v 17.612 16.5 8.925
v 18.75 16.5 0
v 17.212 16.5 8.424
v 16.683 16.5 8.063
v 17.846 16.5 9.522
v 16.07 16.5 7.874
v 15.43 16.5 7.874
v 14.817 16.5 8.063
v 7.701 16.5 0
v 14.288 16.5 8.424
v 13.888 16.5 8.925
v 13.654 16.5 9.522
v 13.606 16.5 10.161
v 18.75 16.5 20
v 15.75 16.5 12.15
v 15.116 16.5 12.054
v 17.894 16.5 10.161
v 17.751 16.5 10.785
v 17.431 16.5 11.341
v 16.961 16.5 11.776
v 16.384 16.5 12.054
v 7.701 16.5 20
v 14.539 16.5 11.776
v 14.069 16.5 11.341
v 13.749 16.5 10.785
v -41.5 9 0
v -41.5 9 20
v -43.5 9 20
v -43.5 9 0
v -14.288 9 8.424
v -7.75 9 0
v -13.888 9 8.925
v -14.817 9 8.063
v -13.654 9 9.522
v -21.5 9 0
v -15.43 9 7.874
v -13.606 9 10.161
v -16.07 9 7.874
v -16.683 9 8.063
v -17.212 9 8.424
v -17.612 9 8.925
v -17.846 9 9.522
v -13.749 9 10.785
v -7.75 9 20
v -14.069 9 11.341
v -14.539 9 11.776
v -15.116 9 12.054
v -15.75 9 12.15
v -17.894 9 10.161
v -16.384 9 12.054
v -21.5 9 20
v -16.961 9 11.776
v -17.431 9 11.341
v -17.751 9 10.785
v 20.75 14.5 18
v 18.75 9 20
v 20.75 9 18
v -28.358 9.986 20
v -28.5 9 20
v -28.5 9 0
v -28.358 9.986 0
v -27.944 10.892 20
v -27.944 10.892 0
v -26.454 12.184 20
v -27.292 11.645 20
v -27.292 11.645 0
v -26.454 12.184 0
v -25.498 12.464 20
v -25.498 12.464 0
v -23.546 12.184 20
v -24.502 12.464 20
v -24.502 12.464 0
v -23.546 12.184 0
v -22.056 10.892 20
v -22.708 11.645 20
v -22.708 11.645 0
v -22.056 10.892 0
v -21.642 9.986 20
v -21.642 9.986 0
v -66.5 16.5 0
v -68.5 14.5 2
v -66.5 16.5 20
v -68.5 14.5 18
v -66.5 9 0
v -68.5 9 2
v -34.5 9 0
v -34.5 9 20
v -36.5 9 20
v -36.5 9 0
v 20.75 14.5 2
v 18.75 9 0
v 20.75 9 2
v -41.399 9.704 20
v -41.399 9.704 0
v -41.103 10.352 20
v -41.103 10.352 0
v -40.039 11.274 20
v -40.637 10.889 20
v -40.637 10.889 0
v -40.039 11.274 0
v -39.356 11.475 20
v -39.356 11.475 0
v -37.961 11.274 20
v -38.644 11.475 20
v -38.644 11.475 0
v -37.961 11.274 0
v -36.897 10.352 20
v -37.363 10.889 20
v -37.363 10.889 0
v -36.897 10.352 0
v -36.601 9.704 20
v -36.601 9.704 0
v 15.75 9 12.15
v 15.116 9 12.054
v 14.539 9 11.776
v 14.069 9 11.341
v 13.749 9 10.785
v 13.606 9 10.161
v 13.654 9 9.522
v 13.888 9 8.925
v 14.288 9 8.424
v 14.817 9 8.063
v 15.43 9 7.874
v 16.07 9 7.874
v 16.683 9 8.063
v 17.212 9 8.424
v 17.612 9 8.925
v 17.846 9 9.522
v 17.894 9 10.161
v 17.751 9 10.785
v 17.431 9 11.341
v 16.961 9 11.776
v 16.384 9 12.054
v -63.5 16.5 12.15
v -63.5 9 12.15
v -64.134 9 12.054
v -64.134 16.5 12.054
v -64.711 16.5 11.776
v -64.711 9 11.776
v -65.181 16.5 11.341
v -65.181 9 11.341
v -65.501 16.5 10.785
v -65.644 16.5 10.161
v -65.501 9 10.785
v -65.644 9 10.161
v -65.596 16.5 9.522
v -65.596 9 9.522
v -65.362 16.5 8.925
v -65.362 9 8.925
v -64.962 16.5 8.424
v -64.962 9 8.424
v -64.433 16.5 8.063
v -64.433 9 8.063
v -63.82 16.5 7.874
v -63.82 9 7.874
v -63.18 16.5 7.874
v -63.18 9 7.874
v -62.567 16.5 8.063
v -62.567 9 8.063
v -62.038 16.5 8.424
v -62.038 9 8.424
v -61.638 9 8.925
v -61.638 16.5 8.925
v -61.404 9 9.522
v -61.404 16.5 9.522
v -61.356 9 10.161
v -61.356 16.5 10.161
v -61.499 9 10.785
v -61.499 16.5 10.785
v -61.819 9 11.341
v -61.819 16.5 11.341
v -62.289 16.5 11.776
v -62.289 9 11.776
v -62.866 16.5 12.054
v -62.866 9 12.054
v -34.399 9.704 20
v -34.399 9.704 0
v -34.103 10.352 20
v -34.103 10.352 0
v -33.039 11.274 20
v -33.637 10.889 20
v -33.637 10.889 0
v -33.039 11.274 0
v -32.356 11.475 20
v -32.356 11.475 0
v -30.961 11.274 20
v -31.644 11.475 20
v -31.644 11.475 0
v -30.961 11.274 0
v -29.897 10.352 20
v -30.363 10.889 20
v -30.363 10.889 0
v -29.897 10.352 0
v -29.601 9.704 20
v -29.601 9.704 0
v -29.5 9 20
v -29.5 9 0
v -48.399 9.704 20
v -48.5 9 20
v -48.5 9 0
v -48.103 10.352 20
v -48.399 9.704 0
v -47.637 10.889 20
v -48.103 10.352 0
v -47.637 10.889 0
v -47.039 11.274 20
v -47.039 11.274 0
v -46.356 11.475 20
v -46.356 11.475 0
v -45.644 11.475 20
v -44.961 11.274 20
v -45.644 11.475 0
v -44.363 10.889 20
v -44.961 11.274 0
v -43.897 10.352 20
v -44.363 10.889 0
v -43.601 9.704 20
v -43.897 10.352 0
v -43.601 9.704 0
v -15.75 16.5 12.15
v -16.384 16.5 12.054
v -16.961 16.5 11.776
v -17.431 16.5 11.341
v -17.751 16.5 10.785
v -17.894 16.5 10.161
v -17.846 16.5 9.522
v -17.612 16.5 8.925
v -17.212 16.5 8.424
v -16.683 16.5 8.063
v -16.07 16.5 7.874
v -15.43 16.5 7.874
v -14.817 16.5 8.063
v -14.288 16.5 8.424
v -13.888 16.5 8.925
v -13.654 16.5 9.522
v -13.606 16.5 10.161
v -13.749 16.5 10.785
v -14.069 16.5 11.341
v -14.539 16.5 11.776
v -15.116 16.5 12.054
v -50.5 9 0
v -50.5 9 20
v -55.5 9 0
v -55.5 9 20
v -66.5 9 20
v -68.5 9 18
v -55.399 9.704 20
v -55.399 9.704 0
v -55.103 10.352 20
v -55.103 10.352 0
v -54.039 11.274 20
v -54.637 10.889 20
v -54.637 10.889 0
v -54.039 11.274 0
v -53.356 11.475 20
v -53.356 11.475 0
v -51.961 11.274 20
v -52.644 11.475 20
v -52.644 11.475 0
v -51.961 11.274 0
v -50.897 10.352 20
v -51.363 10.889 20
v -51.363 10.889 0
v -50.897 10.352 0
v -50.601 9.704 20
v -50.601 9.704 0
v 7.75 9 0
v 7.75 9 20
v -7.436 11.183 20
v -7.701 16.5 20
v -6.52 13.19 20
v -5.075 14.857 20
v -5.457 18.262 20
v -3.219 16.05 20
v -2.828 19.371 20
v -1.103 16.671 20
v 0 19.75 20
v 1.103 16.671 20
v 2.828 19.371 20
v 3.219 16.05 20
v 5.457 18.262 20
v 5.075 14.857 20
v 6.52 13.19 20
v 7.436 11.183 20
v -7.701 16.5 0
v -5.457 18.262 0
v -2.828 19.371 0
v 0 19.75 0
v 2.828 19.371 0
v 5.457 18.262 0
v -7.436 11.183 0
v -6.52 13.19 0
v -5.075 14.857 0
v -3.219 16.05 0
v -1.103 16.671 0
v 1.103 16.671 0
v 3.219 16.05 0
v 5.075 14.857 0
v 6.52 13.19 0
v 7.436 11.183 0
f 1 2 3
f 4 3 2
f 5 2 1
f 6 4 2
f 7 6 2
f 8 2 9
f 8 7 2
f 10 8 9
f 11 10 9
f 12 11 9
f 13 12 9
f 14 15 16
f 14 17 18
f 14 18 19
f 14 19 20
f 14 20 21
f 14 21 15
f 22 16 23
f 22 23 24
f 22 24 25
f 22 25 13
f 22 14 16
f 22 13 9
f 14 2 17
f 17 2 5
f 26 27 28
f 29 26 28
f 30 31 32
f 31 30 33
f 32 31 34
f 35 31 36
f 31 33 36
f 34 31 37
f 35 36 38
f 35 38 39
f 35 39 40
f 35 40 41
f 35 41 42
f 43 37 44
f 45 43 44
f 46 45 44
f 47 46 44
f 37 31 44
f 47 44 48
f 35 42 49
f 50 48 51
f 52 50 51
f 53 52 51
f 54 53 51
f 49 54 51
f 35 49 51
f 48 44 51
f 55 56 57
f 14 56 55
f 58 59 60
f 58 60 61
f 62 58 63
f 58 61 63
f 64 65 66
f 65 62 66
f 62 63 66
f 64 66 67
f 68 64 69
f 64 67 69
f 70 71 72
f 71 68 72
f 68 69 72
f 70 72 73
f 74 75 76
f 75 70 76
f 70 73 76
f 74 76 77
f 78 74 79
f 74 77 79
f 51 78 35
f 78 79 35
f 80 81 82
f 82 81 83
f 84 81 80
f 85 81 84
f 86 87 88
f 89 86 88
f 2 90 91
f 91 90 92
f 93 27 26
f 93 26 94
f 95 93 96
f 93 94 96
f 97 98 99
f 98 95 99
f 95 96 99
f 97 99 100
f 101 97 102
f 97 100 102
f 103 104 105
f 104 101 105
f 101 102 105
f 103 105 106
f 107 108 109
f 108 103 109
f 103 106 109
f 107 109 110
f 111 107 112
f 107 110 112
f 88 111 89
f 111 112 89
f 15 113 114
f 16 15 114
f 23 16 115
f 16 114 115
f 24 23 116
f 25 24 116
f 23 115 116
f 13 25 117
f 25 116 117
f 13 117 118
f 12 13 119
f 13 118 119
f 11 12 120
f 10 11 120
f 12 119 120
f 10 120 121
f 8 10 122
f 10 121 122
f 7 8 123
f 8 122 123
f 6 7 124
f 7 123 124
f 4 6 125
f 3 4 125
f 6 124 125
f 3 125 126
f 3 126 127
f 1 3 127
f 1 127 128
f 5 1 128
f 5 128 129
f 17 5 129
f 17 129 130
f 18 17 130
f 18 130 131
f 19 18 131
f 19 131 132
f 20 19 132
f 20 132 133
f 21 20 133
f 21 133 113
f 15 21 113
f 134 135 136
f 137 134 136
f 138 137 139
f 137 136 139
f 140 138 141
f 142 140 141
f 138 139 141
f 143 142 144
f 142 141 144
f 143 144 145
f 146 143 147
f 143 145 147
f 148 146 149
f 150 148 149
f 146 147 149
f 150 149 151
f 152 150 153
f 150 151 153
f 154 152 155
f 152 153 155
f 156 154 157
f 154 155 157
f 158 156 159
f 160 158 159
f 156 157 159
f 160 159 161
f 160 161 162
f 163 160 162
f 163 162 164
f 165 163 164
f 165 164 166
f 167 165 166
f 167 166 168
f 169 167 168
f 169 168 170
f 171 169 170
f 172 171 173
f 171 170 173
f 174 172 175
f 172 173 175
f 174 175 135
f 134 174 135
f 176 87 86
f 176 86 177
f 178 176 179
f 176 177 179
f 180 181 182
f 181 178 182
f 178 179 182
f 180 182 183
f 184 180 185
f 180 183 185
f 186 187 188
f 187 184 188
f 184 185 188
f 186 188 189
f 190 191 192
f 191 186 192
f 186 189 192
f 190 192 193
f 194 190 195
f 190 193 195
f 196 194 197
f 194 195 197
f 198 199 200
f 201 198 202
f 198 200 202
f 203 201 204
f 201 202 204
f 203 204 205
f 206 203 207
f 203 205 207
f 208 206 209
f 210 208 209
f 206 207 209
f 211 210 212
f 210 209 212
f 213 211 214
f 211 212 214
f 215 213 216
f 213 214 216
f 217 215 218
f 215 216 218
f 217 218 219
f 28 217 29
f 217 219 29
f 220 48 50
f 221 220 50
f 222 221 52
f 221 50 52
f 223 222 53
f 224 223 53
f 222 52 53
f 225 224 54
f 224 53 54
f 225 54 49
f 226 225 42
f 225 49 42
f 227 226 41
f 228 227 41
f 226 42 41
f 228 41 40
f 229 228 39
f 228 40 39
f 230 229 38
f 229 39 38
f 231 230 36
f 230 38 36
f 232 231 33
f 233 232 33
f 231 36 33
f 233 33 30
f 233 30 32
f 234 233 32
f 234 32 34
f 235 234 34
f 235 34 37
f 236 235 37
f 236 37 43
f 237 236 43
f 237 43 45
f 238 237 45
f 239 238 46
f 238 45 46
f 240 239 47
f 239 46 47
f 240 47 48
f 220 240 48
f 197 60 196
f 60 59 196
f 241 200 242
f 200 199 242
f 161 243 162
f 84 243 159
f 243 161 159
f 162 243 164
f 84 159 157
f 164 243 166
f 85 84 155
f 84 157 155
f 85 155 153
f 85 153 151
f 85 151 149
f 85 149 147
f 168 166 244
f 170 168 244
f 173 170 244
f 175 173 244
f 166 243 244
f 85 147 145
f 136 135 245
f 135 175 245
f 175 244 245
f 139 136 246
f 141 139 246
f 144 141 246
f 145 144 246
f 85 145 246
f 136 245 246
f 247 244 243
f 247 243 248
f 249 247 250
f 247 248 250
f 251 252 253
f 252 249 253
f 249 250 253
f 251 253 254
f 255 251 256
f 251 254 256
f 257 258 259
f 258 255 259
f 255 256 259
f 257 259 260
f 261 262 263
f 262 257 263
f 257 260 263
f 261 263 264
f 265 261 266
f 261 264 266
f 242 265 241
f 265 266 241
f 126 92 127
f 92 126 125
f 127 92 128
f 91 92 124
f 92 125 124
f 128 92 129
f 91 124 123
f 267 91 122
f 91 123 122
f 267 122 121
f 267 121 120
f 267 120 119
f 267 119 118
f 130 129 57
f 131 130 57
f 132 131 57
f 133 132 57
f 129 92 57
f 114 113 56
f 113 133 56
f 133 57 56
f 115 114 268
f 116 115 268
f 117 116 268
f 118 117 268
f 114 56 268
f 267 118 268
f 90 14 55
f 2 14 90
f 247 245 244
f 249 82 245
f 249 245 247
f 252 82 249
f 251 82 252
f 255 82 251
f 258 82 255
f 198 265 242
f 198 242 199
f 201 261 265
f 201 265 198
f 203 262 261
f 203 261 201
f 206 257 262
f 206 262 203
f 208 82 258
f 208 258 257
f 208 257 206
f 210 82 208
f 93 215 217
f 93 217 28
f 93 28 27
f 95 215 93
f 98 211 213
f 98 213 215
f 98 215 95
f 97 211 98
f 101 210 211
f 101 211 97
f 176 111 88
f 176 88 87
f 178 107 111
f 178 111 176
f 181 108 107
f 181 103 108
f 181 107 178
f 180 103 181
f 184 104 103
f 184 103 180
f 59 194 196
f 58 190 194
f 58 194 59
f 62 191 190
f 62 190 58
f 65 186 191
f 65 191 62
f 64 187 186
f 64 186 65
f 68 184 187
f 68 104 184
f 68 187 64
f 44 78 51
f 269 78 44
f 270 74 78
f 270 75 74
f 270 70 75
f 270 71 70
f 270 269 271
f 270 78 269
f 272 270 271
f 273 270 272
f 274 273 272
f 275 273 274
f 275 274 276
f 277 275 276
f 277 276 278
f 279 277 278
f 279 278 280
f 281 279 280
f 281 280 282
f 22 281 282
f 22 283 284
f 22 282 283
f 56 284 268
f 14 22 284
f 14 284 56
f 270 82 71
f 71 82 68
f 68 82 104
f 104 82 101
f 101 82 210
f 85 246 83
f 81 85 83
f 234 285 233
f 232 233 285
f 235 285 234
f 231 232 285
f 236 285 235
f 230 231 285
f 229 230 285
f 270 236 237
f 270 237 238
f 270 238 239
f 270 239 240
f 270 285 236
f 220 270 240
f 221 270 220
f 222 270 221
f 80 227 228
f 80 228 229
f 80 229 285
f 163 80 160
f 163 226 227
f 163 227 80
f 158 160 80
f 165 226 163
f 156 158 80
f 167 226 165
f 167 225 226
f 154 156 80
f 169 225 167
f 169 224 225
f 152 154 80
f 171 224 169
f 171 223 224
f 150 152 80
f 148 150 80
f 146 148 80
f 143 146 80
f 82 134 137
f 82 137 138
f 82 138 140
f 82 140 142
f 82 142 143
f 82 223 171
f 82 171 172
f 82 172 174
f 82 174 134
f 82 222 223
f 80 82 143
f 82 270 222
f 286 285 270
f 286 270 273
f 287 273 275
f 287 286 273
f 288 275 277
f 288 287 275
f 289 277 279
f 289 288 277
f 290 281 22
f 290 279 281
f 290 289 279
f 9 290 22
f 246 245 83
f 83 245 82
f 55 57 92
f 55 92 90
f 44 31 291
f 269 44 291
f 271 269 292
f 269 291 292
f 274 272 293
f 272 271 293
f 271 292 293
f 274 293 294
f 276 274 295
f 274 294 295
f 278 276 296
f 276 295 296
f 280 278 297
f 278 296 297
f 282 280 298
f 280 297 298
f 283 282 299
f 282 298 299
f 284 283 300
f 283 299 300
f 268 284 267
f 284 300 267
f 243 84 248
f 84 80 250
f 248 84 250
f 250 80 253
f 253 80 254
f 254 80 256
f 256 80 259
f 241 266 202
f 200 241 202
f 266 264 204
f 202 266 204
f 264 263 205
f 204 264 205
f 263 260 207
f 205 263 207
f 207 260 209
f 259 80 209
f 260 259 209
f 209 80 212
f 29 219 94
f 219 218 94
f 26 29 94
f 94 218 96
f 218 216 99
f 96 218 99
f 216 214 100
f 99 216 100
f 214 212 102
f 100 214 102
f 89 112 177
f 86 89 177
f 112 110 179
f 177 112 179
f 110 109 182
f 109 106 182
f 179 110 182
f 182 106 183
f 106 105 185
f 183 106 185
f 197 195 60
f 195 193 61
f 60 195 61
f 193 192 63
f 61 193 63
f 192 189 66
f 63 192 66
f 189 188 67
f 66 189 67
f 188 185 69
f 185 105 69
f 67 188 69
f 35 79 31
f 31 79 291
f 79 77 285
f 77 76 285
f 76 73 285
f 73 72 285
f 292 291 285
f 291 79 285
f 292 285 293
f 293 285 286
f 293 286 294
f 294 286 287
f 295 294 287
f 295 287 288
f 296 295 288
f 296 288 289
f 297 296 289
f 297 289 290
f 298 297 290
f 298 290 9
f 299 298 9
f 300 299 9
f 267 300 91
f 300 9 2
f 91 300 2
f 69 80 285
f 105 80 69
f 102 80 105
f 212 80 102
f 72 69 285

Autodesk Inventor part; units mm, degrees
ref_plane "YZ Plane" through (0, 0, 0) normal (1, 0, 0) x (0, 1, 0)
ref_plane "XZ Plane" through (0, 0, 0) normal (0, 1, 0) x (-1, 0, 0)
ref_plane "XY Plane" through (0, 0, 0) normal (0, 0, 1) x (1, 0, 0)
sketch "スケッチ1" plane through (0, 0, 0) normal (0, 0, 1) x (1, 0, 0)
  circle A0 centre (0, 9) radius 7.75
  line L0 (10.75, 0) -> (-58.5, 0)
  line L1 (-58.5, 0) -> (-58.5, 1.25)
  line L2 (-58.5, 1.25) -> (10.75, 1.25)
  line L3 (10.75, 1.25) -> (10.75, 0)
  circle A1 centre (0, 9) radius 10.75
  line L4 (10.75, 1.25) -> (10.75, 15.8822)
  circle A2 centre (-32, 9) radius 2.5
  circle A3 centre (-39, 9) radius 2.5
  circle A4 centre (-25, 9) radius 3.5
  circle A5 centre (-46, 9) radius 2.5
  circle A6 centre (-53, 9) radius 2.5
  circle A7 centre (-53, 9) radius 5.5
  line L5 (-58.5, 1.25) -> (-58.5, 18.7354)
  line L6 (-61.6708, 14.5) -> (12.7388, 14.5)
  point P0 (0, 0)
  point P1 (-9.2365, 14.5)
  point P2 (-58.5, 14.5)
  point P3 (10.75, 14.5)
  point P4 (9.2365, 14.5)
  dimension "d0" = 15.5
  dimension "d1" = 3
  dimension "d2" = 5
  dimension "d3" = 5
  dimension "d4" = 7
  dimension "d5" = 5
  dimension "d7" = 7
  dimension "d8" = 7
  dimension "d9" = 25
  dimension "d10" = 7
  dimension "d11" = 5
  dimension "d12" = 7
  dimension "d13" = 3
  dimension "d16" = 9
extrude "押し出し1" add sketch "スケッチ1" along normal blind 20 contours A0 L6 A1 L2 | A0 L6 A1 | L2 A1 L6 A0 | L2 A1 L0 | L6 L4 A1 | A1 L0 L1 L2 | L2 L5 A7 A5 L6 A1 | A1 L4 L2 | L2 L3 L0 A1 | A7 A5 | A7 L5 L6 picked at (-49.0972, 10.8197)
sketch "スケッチ3" plane through (0, 0, 20) normal (0, 0, 1) x (1, 0, 0)
  line L0 (-9.2365, 14.5) -> (-58.5, 14.5) projected
  line L1 (-58.5, 14.5) -> (-58.5, 0) projected
  line L2 (-58.5, 0) -> (10.75, 0) projected
  line L3 (10.75, 0) -> (10.75, 14.5) projected
  line L4 (10.75, 14.5) -> (9.2365, 14.5) projected
  arc A0 (9.2365, 14.5) -> (-9.2365, 14.5) centre (0, 9) ccw projected
  circle A1 centre (0, 9) radius 7.75 projected
  circle A2 centre (-53, 9) radius 2.5 projected
  circle A3 centre (-25, 9) radius 3.5 projected
  circle A4 centre (-39, 9) radius 2.5 projected
  circle A5 centre (-32, 9) radius 2.5 projected
  circle A6 centre (-46, 9) radius 2.5 projected
  line L5 (-58.5, 14.5) -> (-58.5, 0) projected
  line L6 (-58.5, 0) -> (-68.5, 0)
  line L7 (-68.5, 0) -> (-68.5, 14.5)
  line L8 (-68.5, 14.5) -> (-58.5, 14.5)
  line L9 (-58.5, 14.5) -> (-58.5, 0)
  line L10 (10.75, 0) -> (20.75, 0)
  line L11 (20.75, 0) -> (20.75, 14.5)
  line L12 (20.75, 14.5) -> (10.75, 14.5)
  line L13 (10.75, 14.5) -> (10.75, 0)
  point P0 (0, 0)
  dimension "d17" = 10
  dimension "d18" = 10
extrude "押し出し2" add sketch "スケッチ3" against normal up to surface (20 mm away) contours L1 L6 L7 L8 | L12 L11 L10 L3
sketch "スケッチ4" plane through (0, 0, 20) normal (0, 0, 1) x (1, 0, 0)
  line L0 (-9.2365, 14.5) -> (-68.5, 14.5) projected
  line L1 (-68.5, 14.5) -> (-68.5, 0) projected
  line L2 (-68.5, 0) -> (20.75, 0) projected
  line L3 (20.75, 0) -> (20.75, 14.5) projected
  line L4 (20.75, 14.5) -> (9.2365, 14.5) projected
  arc A0 (9.2365, 14.5) -> (-9.2365, 14.5) centre (0, 9) ccw projected
  circle A1 centre (0, 9) radius 7.75 projected
  circle A2 centre (-53, 9) radius 2.5 projected
  circle A3 centre (-25, 9) radius 3.5 projected
  circle A4 centre (-39, 9) radius 2.5 projected
  circle A5 centre (-32, 9) radius 2.5 projected
  circle A6 centre (-46, 9) radius 2.5 projected
  line L5 (-68.5, 0) -> (-68.5, 14.5) projected
  line L6 (20.75, 0) -> (20.75, 14.5) projected
  line L7 (-68.5, 0) -> (20.75, 0)
  line L8 (20.75, 0) -> (20.75, 9)
  line L9 (20.75, 9) -> (-68.5, 9)
  line L10 (-68.5, 9) -> (-68.5, 0)
  point P0 (0, 0)
  point P1 (-55.5, 9)
  point P2 (-68.5, 9)
  point P3 (7.75, 9)
  point P4 (-7.75, 9)
  point P5 (-28.5, 9)
  point P6 (-21.5, 9)
  point P7 (-29.5, 9)
  point P8 (-34.5, 9)
  point P9 (-36.5, 9)
  point P10 (-41.5, 9)
  point P11 (-43.5, 9)
  point P12 (-48.5, 9)
  point P13 (-50.5, 9)
extrude "押し出し3" cut sketch "スケッチ4" against normal through all contours L9 A2 A6 A4 A5 A3 A1 L3 L2 L1 | L9 A3 | A3 L9
sketch "スケッチ6" plane through (0, 0, 20) normal (0, 0, 1) x (1, 0, 0)
  line L0 (-43.5, 9) -> (-41.5, 9) projected
  arc A0 (-36.5, 9) -> (-41.5, 9) centre (-39, 9) ccw projected
  line L1 (-36.5, 9) -> (-34.5, 9) projected
  arc A1 (-29.5, 9) -> (-34.5, 9) centre (-32, 9) ccw projected
  line L2 (-29.5, 9) -> (-28.5, 9) projected
  arc A2 (-21.5, 9) -> (-28.5, 9) centre (-25, 9) ccw projected
  line L3 (-21.5, 9) -> (-7.75, 9) projected
  arc A3 (7.75, 9) -> (-7.75, 9) centre (0, 9) ccw projected
  line L4 (7.75, 9) -> (20.75, 9) projected
  line L5 (20.75, 9) -> (20.75, 14.5) projected
  line L6 (20.75, 14.5) -> (9.2365, 14.5) projected
  arc A4 (9.2365, 14.5) -> (-9.2365, 14.5) centre (0, 9) ccw projected
  line L7 (-9.2365, 14.5) -> (-68.5, 14.5) projected
  line L8 (-68.5, 14.5) -> (-68.5, 9) projected
  line L9 (-68.5, 9) -> (-55.5, 9) projected
  arc A5 (-50.5, 9) -> (-55.5, 9) centre (-53, 9) ccw projected
  line L10 (-50.5, 9) -> (-48.5, 9) projected
  arc A6 (-43.5, 9) -> (-48.5, 9) centre (-46, 9) ccw projected
  line L11 (-68.5, 14.5) -> (20.75, 14.5)
  line L12 (20.75, 14.5) -> (20.75, 16.5)
  line L13 (20.75, 16.5) -> (-68.5, 16.5)
  line L14 (-68.5, 16.5) -> (-68.5, 14.5)
  point P0 (0, 0)
  point P1 (7.7015, 16.5)
  point P2 (-7.7015, 16.5)
  dimension "d33" = 2
extrude "押し出し4" add sketch "スケッチ6" against normal up to surface (20 mm away) contours L14 L13 A4 L7 | L13 L12 L6 A4
sketch "スケッチ7" plane through (7.7015, 16.5, 20) normal (0, 1, 0) x (1, 0, 0)
  line L0 (0, 20) -> (13.0485, 20) projected
  line L1 (0, 0) -> (0, 20) projected
  line L2 (13.0485, 0) -> (0, 0) projected
  line L3 (13.0485, 0) -> (13.0485, 20) projected
  line L4 (-76.2015, 20) -> (-15.4029, 20) projected
  line L5 (-76.2015, 0) -> (-76.2015, 20) projected
  line L6 (-15.4029, 0) -> (-76.2015, 0) projected
  line L7 (-15.4029, 20) -> (-15.4029, 0) projected
  point P0 (-7.7015, 20)
  point P1 (8.0485, 10)
  point P2 (-23.4515, 10)
  point P3 (-71.2015, 10)
  dimension "d36" = 5
  dimension "d37" = 10
  dimension "d38" = 10
  dimension "d39" = 15.75
  dimension "d40" = 5
hole "穴2" at (15.75, 16.5, 10) at (-15.75, 16.5, 10) at (-63.5, 16.5, 10) direction (0, -1, 0) diameter 4.3 end through all
chamfer "面取り1" distance 2 angle 45 2 edges at (20.75, 16.5, 10) (-68.5, 16.5, 10)
chamfer "面取り2" distance 2 angle 45 4 edges at (20.75, 11.75, 0) (20.75, 11.75, 20) (-68.5, 11.75, 0) (-68.5, 11.75, 20)
properties part number "C_Unit_Cable_Holder_A"
